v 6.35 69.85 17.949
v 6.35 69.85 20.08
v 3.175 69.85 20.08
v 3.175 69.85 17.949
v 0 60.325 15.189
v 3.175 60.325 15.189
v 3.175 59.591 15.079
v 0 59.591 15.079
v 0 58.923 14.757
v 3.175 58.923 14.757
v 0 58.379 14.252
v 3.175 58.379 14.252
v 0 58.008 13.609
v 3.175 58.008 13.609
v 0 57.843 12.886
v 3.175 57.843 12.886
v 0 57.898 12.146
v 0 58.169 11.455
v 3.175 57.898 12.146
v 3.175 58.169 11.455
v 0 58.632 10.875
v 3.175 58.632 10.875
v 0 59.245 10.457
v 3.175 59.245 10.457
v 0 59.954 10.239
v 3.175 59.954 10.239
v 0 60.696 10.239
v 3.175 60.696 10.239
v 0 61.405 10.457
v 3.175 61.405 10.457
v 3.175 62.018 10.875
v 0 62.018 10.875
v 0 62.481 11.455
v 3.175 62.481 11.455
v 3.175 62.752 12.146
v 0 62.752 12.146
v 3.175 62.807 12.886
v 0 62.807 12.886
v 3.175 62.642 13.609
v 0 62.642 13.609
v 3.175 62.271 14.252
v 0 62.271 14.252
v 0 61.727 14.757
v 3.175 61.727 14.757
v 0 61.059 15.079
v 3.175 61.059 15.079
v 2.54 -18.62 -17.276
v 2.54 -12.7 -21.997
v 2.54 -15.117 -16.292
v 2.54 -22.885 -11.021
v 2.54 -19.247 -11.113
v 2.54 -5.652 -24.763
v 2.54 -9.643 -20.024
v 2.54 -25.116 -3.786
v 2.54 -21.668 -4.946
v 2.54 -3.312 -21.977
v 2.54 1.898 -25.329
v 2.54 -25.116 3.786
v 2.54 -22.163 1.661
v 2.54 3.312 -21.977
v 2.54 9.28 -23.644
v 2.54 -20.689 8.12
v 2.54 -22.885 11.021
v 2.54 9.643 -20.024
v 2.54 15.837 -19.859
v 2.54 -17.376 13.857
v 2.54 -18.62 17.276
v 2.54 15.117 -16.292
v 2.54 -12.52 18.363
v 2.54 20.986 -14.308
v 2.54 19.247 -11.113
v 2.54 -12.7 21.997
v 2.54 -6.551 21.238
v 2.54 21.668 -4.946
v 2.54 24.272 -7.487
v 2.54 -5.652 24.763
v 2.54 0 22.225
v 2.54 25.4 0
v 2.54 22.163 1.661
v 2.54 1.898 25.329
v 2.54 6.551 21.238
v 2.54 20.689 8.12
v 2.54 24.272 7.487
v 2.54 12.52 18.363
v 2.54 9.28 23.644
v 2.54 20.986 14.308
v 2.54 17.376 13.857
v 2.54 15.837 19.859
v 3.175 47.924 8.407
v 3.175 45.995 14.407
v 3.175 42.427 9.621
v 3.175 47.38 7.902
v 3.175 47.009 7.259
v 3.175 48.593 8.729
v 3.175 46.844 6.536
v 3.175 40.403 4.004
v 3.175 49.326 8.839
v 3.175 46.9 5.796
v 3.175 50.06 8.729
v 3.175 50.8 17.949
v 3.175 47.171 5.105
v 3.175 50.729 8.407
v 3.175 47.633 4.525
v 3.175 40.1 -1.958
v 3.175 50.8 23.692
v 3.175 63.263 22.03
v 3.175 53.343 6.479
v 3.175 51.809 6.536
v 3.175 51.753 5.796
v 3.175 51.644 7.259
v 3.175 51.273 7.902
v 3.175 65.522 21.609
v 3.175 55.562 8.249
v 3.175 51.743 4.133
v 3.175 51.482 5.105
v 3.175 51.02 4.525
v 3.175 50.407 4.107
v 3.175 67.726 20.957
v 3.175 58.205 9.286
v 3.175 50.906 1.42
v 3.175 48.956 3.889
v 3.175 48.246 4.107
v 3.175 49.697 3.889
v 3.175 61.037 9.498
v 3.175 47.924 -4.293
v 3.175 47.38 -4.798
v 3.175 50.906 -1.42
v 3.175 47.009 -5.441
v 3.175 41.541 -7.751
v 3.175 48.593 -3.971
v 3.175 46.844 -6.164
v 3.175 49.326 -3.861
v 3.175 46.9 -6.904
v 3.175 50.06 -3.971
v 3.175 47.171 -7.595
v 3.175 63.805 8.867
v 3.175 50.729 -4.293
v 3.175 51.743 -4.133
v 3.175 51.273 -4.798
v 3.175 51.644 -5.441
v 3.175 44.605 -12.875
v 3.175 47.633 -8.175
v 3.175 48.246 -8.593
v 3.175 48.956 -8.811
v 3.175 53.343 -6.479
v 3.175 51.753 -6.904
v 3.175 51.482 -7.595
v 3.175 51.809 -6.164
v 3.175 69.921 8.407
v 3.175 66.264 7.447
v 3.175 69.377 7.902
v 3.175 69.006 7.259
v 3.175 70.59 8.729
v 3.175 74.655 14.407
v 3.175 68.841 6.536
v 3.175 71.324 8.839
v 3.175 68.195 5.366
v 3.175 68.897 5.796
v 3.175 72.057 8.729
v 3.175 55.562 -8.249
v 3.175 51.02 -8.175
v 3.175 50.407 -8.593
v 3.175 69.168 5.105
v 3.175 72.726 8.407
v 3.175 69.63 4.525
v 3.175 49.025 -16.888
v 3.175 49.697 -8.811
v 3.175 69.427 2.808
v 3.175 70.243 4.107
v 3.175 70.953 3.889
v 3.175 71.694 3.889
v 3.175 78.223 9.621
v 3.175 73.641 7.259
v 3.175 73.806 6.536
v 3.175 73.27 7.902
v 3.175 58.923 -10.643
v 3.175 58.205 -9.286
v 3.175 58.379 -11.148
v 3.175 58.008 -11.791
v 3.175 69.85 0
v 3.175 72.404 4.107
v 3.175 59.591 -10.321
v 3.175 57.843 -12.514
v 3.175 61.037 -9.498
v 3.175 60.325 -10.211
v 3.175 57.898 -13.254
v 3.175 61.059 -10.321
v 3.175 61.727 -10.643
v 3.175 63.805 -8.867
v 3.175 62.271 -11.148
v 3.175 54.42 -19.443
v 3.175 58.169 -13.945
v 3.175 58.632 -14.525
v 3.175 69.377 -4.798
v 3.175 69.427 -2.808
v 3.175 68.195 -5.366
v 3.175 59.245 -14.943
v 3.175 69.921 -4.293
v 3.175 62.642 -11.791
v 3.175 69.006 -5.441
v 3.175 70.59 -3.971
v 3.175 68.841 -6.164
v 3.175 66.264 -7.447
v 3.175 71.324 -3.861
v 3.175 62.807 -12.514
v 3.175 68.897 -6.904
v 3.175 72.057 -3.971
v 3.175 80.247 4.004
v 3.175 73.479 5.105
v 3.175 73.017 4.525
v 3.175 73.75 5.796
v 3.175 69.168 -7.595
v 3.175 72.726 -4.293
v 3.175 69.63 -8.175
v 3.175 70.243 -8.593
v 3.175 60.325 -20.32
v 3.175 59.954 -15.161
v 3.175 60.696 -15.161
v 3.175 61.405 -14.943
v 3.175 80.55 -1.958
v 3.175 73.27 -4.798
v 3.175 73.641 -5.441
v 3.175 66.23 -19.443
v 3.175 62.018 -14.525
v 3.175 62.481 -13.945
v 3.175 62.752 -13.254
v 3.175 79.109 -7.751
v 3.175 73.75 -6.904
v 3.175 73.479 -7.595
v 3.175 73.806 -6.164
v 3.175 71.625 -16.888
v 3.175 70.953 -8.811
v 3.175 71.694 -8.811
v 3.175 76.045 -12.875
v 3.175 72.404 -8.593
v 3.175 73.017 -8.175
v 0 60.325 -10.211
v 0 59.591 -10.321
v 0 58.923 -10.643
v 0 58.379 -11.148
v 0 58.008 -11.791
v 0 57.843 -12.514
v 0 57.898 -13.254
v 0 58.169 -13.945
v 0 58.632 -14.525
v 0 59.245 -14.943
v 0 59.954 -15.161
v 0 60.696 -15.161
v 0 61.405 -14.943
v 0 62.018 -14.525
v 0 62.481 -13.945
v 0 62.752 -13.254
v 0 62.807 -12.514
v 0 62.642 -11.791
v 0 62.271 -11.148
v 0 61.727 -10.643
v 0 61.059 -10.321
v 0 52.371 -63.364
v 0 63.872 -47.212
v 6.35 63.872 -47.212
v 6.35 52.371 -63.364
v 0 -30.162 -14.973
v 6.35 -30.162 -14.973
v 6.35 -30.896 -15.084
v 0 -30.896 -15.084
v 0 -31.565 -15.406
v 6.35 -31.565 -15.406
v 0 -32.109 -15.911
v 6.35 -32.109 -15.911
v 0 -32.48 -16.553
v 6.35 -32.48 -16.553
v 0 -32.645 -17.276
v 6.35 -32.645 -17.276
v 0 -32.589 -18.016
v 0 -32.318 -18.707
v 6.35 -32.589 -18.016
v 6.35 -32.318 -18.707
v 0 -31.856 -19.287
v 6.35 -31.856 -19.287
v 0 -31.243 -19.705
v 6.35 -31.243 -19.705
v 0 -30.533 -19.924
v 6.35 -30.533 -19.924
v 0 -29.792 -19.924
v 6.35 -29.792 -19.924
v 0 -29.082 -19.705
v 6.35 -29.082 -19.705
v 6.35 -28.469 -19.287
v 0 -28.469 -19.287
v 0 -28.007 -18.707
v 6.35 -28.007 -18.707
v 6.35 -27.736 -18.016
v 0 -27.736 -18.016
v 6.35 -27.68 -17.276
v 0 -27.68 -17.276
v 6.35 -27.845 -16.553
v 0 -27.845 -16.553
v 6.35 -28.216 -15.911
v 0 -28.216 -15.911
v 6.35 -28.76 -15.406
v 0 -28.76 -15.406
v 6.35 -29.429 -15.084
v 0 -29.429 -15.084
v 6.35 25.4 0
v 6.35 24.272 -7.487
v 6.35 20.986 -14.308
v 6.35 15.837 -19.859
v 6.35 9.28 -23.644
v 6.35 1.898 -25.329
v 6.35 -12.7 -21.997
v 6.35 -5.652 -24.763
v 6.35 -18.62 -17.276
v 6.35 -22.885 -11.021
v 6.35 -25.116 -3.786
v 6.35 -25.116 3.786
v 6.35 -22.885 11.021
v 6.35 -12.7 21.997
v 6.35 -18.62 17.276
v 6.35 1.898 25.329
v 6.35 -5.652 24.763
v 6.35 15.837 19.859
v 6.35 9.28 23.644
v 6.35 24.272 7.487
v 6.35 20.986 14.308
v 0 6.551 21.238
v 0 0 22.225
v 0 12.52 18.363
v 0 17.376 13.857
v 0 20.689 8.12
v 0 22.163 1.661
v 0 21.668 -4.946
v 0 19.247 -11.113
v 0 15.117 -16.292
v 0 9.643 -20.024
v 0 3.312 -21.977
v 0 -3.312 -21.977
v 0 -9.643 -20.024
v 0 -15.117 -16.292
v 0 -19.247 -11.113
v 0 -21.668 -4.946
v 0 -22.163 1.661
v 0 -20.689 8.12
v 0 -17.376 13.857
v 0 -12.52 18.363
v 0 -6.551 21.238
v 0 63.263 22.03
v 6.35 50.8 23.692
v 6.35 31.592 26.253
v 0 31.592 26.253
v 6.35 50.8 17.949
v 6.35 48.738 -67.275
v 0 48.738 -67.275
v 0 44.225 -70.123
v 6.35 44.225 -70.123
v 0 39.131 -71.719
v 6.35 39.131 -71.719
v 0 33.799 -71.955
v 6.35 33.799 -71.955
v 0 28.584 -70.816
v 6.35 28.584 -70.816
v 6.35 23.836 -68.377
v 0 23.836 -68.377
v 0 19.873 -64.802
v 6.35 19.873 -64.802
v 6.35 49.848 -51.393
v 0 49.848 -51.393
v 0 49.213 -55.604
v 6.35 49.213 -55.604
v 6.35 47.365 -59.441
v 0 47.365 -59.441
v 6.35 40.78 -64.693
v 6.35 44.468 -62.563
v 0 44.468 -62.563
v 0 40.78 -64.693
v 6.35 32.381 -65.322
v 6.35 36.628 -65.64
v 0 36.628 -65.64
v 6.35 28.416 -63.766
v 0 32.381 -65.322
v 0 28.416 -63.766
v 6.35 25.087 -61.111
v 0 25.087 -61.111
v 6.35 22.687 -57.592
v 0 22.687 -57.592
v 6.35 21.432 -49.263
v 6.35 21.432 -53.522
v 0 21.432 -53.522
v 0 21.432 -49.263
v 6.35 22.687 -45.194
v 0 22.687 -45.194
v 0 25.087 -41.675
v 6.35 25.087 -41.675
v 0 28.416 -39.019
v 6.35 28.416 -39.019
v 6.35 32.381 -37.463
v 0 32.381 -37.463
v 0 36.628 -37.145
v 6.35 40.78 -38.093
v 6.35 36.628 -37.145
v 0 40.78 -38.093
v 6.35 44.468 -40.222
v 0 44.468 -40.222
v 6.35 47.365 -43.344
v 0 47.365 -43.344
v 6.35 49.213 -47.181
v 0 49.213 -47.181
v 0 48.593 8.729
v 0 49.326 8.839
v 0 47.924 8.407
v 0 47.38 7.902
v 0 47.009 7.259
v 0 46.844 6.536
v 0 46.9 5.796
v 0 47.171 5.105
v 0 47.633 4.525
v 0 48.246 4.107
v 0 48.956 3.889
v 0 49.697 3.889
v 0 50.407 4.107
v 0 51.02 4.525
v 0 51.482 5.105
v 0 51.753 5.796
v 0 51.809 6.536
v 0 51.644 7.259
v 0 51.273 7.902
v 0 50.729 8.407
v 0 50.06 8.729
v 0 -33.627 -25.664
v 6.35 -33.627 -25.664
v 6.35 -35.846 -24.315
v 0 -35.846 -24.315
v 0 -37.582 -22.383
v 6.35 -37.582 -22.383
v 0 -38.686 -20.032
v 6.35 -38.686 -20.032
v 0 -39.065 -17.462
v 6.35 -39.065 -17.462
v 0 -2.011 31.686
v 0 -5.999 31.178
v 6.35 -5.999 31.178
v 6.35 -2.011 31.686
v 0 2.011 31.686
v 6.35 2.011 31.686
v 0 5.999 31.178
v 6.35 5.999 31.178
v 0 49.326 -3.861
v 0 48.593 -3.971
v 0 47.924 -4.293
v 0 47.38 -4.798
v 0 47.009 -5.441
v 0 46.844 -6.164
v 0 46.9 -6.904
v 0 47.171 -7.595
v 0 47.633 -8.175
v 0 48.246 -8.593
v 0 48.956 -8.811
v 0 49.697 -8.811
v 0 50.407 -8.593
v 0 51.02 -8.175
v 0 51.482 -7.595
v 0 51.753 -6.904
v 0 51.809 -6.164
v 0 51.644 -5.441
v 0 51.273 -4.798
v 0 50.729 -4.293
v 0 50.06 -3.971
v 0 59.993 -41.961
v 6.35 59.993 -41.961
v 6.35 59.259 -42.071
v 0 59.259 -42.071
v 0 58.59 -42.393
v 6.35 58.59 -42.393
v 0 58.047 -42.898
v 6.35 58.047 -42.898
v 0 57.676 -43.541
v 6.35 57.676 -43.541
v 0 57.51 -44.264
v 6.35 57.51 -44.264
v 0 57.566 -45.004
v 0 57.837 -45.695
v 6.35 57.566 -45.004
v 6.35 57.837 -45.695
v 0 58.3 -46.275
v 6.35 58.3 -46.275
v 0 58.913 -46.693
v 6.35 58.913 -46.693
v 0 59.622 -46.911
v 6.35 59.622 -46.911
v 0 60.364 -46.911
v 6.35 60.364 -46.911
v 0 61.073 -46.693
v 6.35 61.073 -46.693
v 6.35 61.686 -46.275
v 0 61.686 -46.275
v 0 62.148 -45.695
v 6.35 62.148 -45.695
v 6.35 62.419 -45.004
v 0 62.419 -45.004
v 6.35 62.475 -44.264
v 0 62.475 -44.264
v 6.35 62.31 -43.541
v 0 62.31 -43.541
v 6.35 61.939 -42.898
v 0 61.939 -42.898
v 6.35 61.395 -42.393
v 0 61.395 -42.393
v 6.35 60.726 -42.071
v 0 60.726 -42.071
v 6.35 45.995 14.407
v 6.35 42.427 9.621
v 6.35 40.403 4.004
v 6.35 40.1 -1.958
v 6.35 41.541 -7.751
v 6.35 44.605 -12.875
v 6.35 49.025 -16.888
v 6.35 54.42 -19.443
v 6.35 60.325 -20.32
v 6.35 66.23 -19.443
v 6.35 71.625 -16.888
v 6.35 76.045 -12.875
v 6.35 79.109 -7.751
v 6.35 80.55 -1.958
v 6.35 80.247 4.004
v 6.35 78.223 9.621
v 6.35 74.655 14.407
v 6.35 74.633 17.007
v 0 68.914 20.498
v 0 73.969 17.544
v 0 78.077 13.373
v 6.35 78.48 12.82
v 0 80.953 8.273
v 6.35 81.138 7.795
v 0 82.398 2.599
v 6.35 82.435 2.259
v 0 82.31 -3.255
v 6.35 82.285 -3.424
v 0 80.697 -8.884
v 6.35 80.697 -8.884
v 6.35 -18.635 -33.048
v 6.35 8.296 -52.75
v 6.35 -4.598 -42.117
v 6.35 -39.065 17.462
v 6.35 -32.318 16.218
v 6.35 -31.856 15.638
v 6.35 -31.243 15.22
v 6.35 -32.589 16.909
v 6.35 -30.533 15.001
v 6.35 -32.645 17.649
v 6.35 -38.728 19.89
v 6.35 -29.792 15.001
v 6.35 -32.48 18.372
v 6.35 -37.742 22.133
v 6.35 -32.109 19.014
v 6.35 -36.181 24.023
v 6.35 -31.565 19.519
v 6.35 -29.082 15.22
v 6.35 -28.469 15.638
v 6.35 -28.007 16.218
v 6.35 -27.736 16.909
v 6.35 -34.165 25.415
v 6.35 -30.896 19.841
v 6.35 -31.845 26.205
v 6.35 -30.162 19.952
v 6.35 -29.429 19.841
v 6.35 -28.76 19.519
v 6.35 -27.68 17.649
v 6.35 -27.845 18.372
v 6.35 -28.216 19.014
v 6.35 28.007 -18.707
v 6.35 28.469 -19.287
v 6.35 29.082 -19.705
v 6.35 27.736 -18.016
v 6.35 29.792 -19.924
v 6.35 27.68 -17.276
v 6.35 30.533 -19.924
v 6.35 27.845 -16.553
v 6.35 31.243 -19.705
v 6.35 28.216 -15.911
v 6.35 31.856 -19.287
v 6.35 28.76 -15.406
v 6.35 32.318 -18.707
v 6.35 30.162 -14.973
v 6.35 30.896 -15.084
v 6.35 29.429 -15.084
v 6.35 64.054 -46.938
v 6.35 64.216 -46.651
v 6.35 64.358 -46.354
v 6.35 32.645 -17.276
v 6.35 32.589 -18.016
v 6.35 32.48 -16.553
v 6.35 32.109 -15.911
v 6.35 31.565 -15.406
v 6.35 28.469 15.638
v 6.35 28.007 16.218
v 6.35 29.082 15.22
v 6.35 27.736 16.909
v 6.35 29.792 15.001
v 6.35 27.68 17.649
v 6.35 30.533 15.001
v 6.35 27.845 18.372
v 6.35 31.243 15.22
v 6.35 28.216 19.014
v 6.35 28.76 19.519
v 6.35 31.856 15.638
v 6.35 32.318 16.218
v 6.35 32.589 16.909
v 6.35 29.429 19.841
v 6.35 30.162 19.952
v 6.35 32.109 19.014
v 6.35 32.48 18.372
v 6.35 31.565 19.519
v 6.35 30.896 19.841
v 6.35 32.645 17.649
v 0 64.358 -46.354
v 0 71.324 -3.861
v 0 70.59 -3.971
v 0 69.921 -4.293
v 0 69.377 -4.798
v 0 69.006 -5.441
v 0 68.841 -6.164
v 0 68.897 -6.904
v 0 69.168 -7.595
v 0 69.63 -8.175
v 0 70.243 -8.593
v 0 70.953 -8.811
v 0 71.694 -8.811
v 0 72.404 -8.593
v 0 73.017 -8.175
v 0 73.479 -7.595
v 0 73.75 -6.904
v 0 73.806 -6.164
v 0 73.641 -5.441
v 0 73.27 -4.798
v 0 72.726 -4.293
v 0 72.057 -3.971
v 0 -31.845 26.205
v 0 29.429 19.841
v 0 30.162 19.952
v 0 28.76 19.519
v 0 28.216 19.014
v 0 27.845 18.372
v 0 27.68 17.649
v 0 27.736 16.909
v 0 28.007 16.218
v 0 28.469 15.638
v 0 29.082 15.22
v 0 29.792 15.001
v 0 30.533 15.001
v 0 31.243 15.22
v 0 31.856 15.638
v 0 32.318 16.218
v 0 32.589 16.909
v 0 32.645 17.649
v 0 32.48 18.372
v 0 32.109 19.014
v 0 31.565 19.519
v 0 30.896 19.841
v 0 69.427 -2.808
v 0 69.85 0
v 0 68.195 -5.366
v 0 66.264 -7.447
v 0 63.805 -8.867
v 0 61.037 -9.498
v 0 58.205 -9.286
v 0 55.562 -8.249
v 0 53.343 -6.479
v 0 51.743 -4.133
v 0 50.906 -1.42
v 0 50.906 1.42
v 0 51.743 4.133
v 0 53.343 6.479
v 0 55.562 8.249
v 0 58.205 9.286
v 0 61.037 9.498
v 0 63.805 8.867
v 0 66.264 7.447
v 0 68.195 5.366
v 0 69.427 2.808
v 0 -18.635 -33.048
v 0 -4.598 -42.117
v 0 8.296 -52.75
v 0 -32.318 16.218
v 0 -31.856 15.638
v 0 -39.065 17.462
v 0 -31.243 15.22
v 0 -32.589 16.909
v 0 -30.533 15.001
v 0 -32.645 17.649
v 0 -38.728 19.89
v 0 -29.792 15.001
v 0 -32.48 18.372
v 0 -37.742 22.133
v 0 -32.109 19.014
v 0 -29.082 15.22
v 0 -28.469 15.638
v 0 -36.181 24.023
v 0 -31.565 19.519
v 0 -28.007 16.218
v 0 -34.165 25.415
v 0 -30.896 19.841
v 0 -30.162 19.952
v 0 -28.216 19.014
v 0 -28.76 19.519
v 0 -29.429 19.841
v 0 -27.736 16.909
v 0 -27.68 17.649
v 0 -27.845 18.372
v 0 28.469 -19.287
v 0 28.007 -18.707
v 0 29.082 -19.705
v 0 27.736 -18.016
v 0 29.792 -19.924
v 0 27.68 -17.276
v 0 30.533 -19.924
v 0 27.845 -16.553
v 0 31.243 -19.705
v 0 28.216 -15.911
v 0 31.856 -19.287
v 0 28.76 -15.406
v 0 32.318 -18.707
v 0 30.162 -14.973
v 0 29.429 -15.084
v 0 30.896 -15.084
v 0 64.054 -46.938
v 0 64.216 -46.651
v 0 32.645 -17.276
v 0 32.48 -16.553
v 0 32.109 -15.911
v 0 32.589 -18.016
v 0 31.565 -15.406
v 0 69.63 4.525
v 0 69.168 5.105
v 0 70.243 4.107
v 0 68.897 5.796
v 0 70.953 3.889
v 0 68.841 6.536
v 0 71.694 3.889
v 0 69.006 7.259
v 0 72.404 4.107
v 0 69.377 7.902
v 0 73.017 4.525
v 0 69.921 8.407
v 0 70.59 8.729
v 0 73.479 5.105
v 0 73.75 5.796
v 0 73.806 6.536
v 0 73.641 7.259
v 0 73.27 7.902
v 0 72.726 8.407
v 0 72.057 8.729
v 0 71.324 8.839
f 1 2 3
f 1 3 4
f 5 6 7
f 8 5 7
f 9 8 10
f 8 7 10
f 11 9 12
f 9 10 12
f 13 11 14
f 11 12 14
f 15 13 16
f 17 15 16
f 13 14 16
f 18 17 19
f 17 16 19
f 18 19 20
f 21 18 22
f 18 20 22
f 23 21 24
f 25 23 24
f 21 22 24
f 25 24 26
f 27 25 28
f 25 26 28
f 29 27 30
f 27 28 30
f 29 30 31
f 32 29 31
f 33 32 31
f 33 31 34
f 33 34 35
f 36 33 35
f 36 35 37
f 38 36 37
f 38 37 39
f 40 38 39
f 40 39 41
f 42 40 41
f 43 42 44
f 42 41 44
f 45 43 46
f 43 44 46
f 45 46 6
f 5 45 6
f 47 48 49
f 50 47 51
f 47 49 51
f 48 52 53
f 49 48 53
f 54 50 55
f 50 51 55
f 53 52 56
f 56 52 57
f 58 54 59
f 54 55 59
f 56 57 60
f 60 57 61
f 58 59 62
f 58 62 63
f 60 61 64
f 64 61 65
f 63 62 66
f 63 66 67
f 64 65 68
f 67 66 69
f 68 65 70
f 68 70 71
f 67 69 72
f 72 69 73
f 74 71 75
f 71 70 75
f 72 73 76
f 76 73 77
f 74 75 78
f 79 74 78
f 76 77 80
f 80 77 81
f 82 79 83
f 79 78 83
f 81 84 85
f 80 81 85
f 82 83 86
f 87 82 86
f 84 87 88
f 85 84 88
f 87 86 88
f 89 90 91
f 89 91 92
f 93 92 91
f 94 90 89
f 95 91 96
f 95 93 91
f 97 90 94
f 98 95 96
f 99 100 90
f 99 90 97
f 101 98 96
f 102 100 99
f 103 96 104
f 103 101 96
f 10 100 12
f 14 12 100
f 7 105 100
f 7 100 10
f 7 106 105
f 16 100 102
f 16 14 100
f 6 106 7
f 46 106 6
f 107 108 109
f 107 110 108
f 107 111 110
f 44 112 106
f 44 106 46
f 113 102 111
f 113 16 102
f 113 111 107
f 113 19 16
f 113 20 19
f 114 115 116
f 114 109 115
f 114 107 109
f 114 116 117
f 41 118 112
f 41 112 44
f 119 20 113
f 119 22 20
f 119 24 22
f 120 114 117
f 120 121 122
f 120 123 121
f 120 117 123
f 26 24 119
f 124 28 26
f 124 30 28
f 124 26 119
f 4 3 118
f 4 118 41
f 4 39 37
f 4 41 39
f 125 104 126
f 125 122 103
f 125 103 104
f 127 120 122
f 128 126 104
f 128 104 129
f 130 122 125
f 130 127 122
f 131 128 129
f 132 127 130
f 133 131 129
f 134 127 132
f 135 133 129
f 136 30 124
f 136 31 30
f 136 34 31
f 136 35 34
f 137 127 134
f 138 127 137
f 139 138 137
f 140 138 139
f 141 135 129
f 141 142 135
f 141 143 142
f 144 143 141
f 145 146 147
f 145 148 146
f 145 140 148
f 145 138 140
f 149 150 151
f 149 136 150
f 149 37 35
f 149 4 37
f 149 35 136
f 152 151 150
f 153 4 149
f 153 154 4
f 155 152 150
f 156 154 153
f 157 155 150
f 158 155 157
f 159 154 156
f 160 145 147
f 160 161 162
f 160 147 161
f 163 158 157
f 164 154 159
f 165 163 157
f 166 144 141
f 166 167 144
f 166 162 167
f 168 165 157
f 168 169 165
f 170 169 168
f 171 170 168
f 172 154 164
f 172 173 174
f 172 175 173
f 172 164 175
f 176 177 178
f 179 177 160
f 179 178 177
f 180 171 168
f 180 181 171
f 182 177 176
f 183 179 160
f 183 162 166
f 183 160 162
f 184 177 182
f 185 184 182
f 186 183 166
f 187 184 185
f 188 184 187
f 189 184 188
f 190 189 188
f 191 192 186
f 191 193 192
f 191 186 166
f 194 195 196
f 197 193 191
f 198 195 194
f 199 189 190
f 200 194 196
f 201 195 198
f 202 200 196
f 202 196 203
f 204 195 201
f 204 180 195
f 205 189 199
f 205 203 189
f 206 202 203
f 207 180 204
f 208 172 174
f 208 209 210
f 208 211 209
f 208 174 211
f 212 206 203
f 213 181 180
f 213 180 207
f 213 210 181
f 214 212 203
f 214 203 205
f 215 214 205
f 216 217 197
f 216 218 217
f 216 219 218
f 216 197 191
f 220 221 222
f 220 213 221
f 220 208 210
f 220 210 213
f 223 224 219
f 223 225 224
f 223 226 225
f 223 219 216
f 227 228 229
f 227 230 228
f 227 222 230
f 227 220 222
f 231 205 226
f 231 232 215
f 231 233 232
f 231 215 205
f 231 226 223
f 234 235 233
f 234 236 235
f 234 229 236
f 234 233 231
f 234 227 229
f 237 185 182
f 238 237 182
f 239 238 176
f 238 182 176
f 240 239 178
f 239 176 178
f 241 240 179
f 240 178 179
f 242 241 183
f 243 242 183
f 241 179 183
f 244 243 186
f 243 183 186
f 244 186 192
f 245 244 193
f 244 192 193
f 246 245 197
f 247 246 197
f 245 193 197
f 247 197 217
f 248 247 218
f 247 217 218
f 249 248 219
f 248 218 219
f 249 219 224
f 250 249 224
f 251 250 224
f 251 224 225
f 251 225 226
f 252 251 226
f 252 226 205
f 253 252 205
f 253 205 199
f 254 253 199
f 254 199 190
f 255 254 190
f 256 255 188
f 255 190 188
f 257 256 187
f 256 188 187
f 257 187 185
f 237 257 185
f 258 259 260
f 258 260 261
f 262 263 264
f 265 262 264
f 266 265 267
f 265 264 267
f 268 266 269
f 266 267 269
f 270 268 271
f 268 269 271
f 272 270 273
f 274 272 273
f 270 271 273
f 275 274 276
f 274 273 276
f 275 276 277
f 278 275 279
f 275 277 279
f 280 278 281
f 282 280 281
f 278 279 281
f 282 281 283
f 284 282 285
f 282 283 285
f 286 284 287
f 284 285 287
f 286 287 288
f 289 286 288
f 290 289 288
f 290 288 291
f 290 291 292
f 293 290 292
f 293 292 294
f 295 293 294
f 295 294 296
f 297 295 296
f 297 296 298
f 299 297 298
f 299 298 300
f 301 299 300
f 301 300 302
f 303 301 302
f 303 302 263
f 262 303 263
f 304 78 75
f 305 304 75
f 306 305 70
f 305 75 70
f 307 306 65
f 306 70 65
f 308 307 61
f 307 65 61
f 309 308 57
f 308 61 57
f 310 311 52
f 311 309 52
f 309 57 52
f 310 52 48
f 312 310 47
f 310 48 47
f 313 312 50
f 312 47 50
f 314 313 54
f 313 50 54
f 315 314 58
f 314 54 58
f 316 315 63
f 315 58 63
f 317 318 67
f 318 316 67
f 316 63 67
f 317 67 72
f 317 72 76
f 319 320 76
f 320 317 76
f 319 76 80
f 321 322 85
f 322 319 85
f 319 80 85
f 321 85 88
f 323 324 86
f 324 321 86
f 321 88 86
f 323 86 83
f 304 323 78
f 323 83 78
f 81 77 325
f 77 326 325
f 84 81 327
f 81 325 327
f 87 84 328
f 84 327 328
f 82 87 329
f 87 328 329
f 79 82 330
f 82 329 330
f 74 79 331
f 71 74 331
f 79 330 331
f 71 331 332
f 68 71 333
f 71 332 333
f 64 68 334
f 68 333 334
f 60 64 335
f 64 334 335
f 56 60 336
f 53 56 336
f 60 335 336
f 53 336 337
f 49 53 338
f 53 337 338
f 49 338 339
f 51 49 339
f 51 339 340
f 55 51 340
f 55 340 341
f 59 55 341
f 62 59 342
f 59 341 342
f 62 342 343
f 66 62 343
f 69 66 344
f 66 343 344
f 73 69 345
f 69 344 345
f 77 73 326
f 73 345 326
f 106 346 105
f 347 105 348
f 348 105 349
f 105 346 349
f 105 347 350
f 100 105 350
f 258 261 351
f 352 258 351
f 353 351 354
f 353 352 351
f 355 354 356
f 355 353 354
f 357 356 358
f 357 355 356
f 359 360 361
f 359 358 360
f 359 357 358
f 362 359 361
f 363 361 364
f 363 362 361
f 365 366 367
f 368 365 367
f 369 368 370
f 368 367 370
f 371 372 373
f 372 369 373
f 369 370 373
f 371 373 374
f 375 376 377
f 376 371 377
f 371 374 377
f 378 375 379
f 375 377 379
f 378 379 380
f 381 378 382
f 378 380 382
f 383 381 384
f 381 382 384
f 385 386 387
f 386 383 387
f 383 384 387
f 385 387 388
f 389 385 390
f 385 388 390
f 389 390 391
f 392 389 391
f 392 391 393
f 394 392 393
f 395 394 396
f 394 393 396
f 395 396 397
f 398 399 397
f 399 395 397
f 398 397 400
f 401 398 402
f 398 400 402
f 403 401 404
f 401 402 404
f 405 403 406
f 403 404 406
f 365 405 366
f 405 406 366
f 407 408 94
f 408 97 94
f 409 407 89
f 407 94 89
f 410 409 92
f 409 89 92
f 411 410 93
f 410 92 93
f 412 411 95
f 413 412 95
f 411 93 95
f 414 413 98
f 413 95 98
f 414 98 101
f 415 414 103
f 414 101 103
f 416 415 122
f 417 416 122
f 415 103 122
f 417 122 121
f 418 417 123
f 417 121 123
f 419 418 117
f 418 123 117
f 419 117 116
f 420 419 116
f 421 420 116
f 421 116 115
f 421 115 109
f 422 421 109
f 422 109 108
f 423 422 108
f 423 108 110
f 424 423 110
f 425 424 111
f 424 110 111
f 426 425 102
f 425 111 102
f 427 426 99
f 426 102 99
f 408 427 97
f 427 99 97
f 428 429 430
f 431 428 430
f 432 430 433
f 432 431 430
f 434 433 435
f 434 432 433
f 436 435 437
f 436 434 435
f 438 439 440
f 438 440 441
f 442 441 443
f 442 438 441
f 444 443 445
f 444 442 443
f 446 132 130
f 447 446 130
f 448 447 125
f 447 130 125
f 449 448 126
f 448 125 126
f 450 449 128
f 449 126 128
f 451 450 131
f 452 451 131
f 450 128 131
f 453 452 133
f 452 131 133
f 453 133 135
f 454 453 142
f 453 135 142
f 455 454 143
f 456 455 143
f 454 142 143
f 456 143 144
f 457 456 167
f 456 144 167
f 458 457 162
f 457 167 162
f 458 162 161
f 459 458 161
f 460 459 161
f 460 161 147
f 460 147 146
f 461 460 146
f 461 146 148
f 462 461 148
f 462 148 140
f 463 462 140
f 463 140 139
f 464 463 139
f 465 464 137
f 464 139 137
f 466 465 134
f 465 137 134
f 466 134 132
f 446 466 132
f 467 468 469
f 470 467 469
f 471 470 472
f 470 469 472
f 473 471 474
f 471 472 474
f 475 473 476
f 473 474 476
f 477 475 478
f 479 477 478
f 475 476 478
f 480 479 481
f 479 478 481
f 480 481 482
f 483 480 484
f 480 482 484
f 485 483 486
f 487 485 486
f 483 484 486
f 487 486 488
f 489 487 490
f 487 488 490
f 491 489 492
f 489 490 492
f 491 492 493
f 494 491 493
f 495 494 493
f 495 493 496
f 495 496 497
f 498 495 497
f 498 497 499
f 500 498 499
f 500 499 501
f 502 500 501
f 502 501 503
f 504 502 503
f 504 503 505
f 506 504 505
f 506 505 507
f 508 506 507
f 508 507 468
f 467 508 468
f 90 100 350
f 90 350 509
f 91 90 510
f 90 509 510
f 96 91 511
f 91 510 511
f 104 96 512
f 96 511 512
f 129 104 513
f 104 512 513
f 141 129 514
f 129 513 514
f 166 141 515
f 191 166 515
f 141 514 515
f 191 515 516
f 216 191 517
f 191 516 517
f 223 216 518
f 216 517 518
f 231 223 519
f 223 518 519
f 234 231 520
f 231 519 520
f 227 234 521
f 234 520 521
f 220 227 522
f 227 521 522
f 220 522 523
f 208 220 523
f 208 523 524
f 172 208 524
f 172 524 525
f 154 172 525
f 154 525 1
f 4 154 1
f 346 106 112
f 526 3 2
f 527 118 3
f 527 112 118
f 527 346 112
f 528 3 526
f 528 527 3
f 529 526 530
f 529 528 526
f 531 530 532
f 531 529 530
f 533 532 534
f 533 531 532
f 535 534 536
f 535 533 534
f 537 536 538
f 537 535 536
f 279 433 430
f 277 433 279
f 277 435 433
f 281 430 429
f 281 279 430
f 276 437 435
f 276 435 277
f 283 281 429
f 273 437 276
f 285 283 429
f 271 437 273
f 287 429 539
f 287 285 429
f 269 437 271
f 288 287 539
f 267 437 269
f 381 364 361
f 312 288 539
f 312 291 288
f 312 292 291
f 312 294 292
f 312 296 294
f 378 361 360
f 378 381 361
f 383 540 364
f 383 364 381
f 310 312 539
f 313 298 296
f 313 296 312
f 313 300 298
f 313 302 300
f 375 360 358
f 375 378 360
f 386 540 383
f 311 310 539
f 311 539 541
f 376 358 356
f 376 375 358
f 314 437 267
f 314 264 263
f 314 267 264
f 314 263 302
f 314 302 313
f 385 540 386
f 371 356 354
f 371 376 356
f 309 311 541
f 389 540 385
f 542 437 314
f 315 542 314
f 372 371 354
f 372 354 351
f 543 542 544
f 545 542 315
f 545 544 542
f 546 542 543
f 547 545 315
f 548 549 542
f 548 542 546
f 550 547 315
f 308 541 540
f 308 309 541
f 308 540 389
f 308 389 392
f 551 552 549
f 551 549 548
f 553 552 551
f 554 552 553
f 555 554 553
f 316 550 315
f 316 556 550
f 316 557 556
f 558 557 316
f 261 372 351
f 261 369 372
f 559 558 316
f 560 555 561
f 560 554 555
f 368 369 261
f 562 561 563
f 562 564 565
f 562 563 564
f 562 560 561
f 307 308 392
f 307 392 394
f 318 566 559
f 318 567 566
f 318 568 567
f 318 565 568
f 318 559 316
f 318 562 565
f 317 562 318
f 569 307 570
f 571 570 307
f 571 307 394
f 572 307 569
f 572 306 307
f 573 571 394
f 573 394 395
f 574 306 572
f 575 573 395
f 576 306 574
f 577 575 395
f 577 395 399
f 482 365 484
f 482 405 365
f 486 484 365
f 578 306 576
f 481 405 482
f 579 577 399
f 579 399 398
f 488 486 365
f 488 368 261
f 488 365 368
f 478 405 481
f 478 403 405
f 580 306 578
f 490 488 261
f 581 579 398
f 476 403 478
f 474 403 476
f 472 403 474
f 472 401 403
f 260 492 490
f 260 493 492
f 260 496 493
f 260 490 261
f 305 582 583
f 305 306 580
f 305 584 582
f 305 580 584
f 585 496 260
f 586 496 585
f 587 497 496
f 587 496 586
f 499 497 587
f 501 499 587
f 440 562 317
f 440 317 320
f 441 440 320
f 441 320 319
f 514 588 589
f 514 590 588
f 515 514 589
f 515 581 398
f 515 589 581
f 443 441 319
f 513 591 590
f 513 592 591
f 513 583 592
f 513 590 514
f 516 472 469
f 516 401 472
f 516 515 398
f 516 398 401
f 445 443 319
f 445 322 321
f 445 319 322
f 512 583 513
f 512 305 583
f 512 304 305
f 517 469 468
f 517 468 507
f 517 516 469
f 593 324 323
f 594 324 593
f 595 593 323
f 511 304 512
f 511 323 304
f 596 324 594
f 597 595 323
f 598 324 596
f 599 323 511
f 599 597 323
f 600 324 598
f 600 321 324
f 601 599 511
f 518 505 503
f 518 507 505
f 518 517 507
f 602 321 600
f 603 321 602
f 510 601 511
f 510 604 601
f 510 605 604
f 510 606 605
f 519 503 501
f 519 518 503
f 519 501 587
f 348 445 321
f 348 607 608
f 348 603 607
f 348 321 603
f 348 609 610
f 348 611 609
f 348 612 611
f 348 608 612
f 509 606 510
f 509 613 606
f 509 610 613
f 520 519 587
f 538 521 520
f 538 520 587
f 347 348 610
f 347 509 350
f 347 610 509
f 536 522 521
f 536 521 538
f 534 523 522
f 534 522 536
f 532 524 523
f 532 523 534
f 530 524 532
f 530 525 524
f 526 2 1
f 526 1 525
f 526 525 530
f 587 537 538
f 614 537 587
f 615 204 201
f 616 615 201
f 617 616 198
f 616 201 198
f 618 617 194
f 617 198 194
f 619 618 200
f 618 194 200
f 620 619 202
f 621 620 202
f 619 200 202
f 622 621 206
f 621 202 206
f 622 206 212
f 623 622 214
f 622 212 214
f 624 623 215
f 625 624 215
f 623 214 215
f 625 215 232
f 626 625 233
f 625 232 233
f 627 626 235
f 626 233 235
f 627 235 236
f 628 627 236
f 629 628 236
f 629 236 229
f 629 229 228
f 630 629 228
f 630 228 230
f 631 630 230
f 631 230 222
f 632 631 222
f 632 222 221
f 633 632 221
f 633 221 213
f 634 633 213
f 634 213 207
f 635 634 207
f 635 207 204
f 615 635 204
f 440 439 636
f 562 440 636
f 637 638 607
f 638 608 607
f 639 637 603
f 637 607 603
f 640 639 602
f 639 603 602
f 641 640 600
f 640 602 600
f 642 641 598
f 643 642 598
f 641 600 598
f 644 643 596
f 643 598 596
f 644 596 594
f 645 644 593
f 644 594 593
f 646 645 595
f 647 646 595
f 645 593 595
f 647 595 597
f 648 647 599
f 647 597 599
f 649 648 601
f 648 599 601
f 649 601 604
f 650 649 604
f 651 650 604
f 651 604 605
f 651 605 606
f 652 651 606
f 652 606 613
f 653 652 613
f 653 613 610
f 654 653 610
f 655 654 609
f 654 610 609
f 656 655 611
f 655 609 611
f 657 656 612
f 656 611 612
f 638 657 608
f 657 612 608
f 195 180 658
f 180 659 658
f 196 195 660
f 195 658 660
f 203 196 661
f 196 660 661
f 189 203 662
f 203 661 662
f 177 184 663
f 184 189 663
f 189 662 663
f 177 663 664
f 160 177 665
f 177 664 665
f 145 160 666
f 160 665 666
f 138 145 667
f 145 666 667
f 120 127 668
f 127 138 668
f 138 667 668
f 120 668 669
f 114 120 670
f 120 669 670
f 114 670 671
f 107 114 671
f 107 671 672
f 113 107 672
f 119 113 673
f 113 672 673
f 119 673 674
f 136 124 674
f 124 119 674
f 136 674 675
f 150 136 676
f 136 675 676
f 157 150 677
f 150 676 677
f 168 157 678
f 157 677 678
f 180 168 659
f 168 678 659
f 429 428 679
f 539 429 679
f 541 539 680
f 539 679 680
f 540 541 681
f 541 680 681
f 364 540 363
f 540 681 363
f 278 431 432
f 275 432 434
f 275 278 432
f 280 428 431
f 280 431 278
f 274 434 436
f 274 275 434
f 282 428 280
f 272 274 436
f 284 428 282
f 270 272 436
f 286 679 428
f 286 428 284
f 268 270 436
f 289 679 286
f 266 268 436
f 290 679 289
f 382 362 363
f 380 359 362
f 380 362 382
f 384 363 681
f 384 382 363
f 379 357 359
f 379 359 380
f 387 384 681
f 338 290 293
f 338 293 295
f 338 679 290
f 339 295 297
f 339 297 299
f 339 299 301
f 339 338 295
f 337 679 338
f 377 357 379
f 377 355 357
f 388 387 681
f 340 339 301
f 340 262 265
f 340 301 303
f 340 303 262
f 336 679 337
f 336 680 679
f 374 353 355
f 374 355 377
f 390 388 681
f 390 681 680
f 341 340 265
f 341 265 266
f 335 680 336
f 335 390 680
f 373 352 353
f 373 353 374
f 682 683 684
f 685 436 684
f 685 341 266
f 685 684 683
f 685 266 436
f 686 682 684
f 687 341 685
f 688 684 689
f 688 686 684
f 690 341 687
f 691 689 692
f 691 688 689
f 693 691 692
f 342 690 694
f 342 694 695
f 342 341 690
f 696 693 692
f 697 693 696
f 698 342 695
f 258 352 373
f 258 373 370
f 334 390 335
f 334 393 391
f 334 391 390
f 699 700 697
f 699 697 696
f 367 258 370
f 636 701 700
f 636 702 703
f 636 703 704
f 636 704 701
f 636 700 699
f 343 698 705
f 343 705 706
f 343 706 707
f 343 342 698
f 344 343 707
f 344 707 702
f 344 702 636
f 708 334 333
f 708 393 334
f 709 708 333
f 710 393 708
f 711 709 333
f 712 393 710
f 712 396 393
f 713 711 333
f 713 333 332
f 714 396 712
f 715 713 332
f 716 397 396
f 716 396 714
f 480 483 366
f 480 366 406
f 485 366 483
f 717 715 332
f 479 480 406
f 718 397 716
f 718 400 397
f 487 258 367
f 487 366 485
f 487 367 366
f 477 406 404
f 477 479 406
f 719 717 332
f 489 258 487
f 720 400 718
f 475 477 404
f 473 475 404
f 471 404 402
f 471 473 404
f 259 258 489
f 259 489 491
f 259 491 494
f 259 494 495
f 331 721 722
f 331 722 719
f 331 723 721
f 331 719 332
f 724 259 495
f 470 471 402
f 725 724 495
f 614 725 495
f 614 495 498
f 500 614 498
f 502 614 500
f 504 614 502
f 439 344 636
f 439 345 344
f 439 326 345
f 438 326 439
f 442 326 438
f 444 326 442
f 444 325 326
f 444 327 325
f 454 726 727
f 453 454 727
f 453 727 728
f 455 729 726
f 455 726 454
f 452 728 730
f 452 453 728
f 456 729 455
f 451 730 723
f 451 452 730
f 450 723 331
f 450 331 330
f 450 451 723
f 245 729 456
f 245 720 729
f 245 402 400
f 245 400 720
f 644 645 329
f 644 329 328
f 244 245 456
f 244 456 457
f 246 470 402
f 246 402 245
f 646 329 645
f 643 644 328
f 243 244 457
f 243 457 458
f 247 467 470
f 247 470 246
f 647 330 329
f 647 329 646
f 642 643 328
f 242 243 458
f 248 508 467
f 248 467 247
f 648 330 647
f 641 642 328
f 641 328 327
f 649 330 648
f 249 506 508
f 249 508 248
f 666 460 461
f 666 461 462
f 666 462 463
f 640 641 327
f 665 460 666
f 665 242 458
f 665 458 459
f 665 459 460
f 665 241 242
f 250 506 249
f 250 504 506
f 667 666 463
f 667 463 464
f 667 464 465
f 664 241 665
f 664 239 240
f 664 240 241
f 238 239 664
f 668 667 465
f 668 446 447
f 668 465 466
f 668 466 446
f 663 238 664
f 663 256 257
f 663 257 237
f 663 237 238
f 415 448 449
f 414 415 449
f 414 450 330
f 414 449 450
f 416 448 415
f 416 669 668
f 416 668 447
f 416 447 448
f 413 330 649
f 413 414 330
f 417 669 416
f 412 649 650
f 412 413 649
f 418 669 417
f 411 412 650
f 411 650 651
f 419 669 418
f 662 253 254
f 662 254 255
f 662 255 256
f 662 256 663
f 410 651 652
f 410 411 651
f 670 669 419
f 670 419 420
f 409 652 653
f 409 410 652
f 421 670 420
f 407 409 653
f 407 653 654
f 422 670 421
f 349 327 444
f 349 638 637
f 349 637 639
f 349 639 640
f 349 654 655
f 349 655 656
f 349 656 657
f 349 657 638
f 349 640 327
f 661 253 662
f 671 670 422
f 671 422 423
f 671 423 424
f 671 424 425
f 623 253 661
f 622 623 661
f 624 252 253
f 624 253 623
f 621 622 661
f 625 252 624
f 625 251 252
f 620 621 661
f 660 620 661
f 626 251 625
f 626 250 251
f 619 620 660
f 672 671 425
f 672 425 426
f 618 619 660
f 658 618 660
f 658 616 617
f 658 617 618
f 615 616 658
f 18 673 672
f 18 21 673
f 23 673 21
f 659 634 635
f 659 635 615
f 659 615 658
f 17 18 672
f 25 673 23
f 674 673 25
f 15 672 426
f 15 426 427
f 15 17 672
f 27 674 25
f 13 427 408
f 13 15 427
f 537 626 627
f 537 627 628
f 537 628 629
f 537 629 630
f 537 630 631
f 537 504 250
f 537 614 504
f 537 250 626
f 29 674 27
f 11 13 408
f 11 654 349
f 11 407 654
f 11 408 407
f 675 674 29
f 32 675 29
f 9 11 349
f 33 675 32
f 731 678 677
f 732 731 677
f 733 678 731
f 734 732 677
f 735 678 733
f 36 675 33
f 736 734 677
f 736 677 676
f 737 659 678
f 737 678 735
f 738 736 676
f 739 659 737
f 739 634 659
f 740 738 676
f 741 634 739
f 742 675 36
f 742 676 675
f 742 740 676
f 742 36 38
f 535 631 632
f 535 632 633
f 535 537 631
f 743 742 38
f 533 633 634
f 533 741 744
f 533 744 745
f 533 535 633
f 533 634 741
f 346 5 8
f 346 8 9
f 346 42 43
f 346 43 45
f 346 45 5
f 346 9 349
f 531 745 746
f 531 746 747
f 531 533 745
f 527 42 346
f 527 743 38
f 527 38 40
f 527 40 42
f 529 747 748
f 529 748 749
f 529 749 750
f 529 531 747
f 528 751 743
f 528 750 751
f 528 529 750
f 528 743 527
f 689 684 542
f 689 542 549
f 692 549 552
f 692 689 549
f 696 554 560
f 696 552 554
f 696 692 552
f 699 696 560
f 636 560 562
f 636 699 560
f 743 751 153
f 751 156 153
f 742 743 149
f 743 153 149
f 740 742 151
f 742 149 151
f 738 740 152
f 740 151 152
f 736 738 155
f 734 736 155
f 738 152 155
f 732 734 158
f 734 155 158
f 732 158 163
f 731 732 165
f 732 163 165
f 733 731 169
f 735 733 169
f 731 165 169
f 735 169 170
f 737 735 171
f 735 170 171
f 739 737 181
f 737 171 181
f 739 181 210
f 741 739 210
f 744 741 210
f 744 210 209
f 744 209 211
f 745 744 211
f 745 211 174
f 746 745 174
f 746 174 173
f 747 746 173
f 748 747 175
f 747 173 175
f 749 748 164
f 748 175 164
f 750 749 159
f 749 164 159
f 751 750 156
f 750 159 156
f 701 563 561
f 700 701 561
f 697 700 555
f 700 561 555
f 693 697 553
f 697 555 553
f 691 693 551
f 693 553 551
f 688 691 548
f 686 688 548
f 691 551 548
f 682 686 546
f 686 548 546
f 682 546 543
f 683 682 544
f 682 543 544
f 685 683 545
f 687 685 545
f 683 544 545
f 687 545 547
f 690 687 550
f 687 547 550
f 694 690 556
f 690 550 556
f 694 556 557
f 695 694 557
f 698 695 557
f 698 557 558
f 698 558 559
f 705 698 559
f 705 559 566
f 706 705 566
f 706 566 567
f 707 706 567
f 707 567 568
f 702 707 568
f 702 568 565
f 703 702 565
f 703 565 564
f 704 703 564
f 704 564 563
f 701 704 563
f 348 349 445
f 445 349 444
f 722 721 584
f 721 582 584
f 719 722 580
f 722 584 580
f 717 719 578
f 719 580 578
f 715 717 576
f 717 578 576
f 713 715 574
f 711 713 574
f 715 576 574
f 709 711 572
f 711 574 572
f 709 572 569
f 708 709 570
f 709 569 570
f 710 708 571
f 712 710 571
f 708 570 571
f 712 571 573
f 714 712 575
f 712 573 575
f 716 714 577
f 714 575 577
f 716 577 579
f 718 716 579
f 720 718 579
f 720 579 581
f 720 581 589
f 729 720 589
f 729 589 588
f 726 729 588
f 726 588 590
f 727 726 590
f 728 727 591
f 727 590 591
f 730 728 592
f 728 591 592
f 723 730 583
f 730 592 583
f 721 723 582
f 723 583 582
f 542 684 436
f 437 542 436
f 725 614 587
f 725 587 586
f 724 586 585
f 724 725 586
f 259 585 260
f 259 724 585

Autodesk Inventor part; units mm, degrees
ref_plane "YZ Plane" through (0, 0, 0) normal (1, 0, 0) x (0, 1, 0)
ref_plane "XZ Plane" through (0, 0, 0) normal (0, 1, 0) x (-1, 0, 0)
ref_plane "XY Plane" through (0, 0, 0) normal (0, 0, 1) x (1, 0, 0)
sketch "Sketch1" plane through (0, 0, 0) normal (1, 0, 0) x (0, 1, 0)
  circle A0 centre (0, 0) radius 38.1 construction
  line L0 (27.94, -25.903) -> (27.94, -76.2) construction
  line L1 (27.94, -76.2) -> (-27.94, -76.2) construction
  line L2 (-27.94, -76.2) -> (-27.94, -25.903) construction
  line L3 (-30.1625, -17.4625) -> (30.1625, -17.4625) construction
  line L4 (30.1625, -17.4625) -> (30.1625, 17.4625) construction
  line L5 (30.1625, 17.4625) -> (-30.1625, 17.4625) construction
  line L6 (-30.1625, 17.4625) -> (-30.1625, -17.4625) construction
  line L7 (-30.1625, -17.4625) -> (30.1625, 17.4625) construction
  line L8 (30.1625, -17.4625) -> (-30.1625, 17.4625) construction
  circle A1 centre (30.1625, 17.4625) radius 2.5527 construction
  circle A2 centre (30.1625, -17.4625) radius 2.5527 construction
  circle A3 centre (-30.1625, -17.4625) radius 2.5527 construction
  circle A4 centre (-30.1625, 17.4625) radius 2.5527 construction
  point P0 (0, -76.2)
  dimension "d0" = 76.2
  dimension "d1" = 55.88
  dimension "d2" = 76.2
  dimension "d3" = 60.325
  dimension "d4" = 34.925
  dimension "d5" = 5.1054
  dimension "d6" = 5.1054
  dimension "d7" = 5.1054
  dimension "d8" = 5.1054
sketch "Sketch2" plane through (0, 0, 0) normal (1, 0, 0) x (0, 1, 0)
  line L0 (-30.1625, -17.4625) -> (30.1625, -17.4625) construction
  circle A0 centre (30.1625, -17.4625) radius 2.5527 construction
  circle A1 centre (-30.1625, -17.4625) radius 2.5527 construction
  line L1 (-30.1625, 17.4625) -> (-30.1625, -17.4625) construction
  circle A2 centre (-30.1625, 17.4625) radius 2.5527 construction
  line L2 (30.1625, -17.4625) -> (30.1625, 17.4625) construction
  line L3 (30.1625, -17.4625) -> (-30.1625, 17.4625) construction
  line L4 (30.1625, 17.4625) -> (-30.1625, 17.4625) construction
  line L5 (-30.1625, -17.4625) -> (30.1625, 17.4625) construction
  circle A3 centre (30.1625, 17.4625) radius 2.5527 construction
  circle A4 centre (0, 0) radius 38.1 construction
  line L6 (27.94, -25.903) -> (27.94, -76.2) construction
  line L7 (27.94, -76.2) -> (-27.94, -76.2) construction
  line L8 (-27.94, -76.2) -> (-27.94, -25.903) construction
  circle A5 centre (60.325, 0) radius 12.7 construction
  circle A6 centre (35.56, -51.3927) radius 14.2875
  circle A7 centre (35.56, -51.3927) radius 25.4 construction
  circle A8 centre (60.325, 0) radius 9.525
  circle A9 centre (60.325, 0) radius 22.225 construction
  circle A10 centre (30.1625, 17.4625) radius 8.9027 construction
  circle A11 centre (30.1625, -17.4625) radius 8.9027 construction
  circle A12 centre (-30.1625, -17.4625) radius 8.9027 construction
  circle A13 centre (-30.1625, 17.4625) radius 8.9027 construction
  line L9 (63.2628, 22.03) -> (31.3393, 26.2871)
  line L10 (-39.0652, 17.4625) -> (-39.0652, -17.4625)
  arc A14 (80.6974, -8.8835) -> (63.2628, 22.03) centre (60.325, 0) ccw
  arc A15 (31.3393, 26.2871) -> (31.8447, 26.2048) centre (30.1625, 17.4625) ccw
  arc A16 (-31.8447, 26.2048) -> (-39.0652, 17.4625) centre (-30.1625, 17.4625) ccw
  arc A17 (-39.0652, -17.4625) -> (-33.6268, -25.6635) centre (-30.1625, -17.4625) ccw
  circle A18 centre (35.56, -51.3927) radius 25.4 construction
  circle A19 centre (17.331, -33.7048) radius 4.7625 construction
  circle A20 centre (32.8295, -73.6177) radius 4.8895 construction
  circle A21 centre (59.9927, -44.45) radius 4.7625 construction
  circle A22 centre (0, 0) radius 25.4
  circle A23 centre (0, 0) radius 31.75 construction
  line L11 (31.8447, 26.2048) -> (5.9993, 31.178)
  line L12 (-5.9993, 31.178) -> (-31.8447, 26.2048)
  arc A24 (5.9993, 31.178) -> (-5.9993, 31.178) centre (0, 0) ccw
  circle A25 centre (35.56, -51.3927) radius 29.9974 construction
  circle A26 centre (35.56, -51.3927) radius 20.6375 construction
  circle A27 centre (35.56, -51.3927) radius 7.62 construction
  line L13 (80.6974, -8.8835) -> (64.3582, -46.3536)
  line L14 (63.8721, -47.2125) -> (52.3707, -63.3638)
  arc A28 (63.8721, -47.2125) -> (64.3582, -46.3536) centre (59.9927, -44.45) ccw
  arc A29 (19.8728, -64.8023) -> (-33.6268, -25.6635) centre (-89.741, -158.5012) ccw
  arc A30 (19.8728, -64.8023) -> (52.3707, -63.3638) centre (35.56, -51.3927) ccw
  point P0 (0, -76.2)
  point P1 (71.3235, -6.35)
  point P2 (71.3235, 6.35)
  point P3 (60.325, 12.7)
  point P4 (49.3265, 6.35)
  point P5 (49.3265, -6.35)
  point P6 (60.325, -12.7)
  point P7 (29.3562, -76.0235)
  point P8 (31.5932, 26.2532)
  dimension "d9" = 25.4
  dimension "d76" = 50.8
  dimension "d14" = 360
  dimension "d16" = 28.575
  dimension "d17" = 57.0484
  dimension "d19" = 50.8
  dimension "d20" = 19.05
  dimension "d23" = 6.35
  dimension "d43" = 360
  dimension "d45" = 9.525
  dimension "d46" = 9.779
  dimension "d47" = 9.525
  dimension "d56" = 50.8
  dimension "d57" = 6.35
  dimension "d58" = 44.45
  dimension "d60" = 76.2
  dimension "d65" = 59.9948
  dimension "d66" = 6.35
  dimension "d75" = 15.24
  dimension "d77" = 22.225
  dimension "d78" = 44.45
extrude "Extrusion1" add sketch "Sketch2" along normal blind 6.35 contours L11 A15 L9 | A14 L13 A28 L14 A30 A29 A17 L10 A16 L12 A24 L11 L9
hole "Motor Mount Holes" at (0, -30.1625, -17.4625) at (0, 30.1625, -17.4625) at (0, -30.1625, 17.4625) at (0, 30.1625, 17.4625) at (0, 0, -76.2) at (0, 71.3235, -6.35) at (0, 71.3235, 6.35) at (0, 60.325, 12.7) at (0, 49.3265, 6.35) at (0, 49.3265, -6.35) at (0, 60.325, -12.7) direction (1, 0, 0) diameter 4.9784 end through all clearance for "Flat Head Machine Screw (82)" size "#10" standard "Ansi Unified Screw Threads"
hole "Hole3" at (0, 59.9927, -44.45) direction (1, 0, 0) diameter 4.9784 end through all clearance for "Flat Head Machine Screw (82)" size "#10" standard "Ansi Unified Screw Threads"
sketch "Sketch3" plane through (6.35, 0, 0) normal (1, 0, 0) x (0, 0, -1)
  circle A0 centre (0, 60.325) radius 9.525 projected
  circle A1 centre (0, 60.325) radius 20.32
  point P0 (0, 0)
  dimension "d61" = 40.64
extrude "Extrusion2" cut sketch "Sketch3" against normal blind 3.175
sketch "Sketch4" plane through (6.35, 0, 0) normal (1, 0, 0) x (0, 0, -1)
  circle A0 centre (0, 60.325) radius 20.32 projected
  circle A1 centre (44.45, 59.9927) radius 2.4892 projected
  circle A2 centre (-17.4625, 30.1625) radius 2.4892 projected
  circle A3 centre (17.4625, 30.1625) radius 2.4892 projected
  circle A4 centre (17.4625, -30.1625) radius 2.4892 projected
  circle A5 centre (-17.4625, -30.1625) radius 2.4892 projected
  circle A6 centre (51.3927, 35.56) radius 14.2875 projected
  circle A7 centre (0, 0) radius 25.4 projected
  line L0 (17.4625, -39.0652) -> (-17.4625, -39.0652) projected
  arc A8 (-26.2048, -31.8447) -> (-17.4625, -39.0652) centre (-17.4625, -30.1625) ccw projected
  line L1 (-26.2048, -31.8447) -> (-31.178, -5.9993) projected
  arc A9 (-31.178, 5.9993) -> (-31.178, -5.9993) centre (0, 0) ccw projected
  line L2 (-31.178, 5.9993) -> (-26.2532, 31.5932) projected
  line L3 (-26.2532, 31.5932) -> (-22.03, 63.2628) projected
  arc A10 (8.8835, 80.6974) -> (-22.03, 63.2628) centre (0, 60.325) ccw projected
  line L4 (-20.0805, 69.85) -> (-17.9493, 69.85)
  circle A11 centre (0, 60.325) radius 20.32 projected
  line L5 (-22.03, 63.2628) -> (-26.2532, 31.5932) projected
  line L6 (-23.6919, 50.8) -> (-17.9493, 50.8)
  arc A12 (8.8835, 80.6974) -> (-22.03, 63.2628) centre (0, 60.325) ccw projected
  line L7 (8.8835, 80.6974) -> (46.3536, 64.3582) projected
  arc A13 (47.2125, 63.8721) -> (46.3536, 64.3582) centre (44.45, 59.9927) ccw projected
  line L8 (47.2125, 63.8721) -> (63.3638, 52.3707) projected
  arc A14 (64.8023, 19.8728) -> (25.6635, -33.6268) centre (158.5012, -89.741) ccw projected
  arc A15 (17.4625, -39.0652) -> (25.6635, -33.6268) centre (17.4625, -30.1625) ccw projected
  arc A16 (64.8023, 19.8728) -> (63.3638, 52.3707) centre (51.3927, 35.56) ccw projected
  point P0 (5.7277, 81.7993)
  point P1 (-20.8206, 50.8)
  point P2 (-19.0149, 69.85)
  dimension "d68" = 19.05
  dimension "d69" = 9.525
extrude "Extrusion3" cut sketch "Sketch4" against normal blind 3.175 contours A0 L6 L3 A10 L4
sketch "Sketch5" plane through (0, 0, 0) normal (-1, 0, 0) x (0, 0, 1)
  circle A0 centre (0, 0) radius 22.225
  circle A1 centre (0, 0) radius 25.4 projected
  dimension "d72" = 44.45
extrude "Extrusion4" add sketch "Sketch5" against normal blind 2.54
properties part number "AR-002" material "Aluminum 6061"
